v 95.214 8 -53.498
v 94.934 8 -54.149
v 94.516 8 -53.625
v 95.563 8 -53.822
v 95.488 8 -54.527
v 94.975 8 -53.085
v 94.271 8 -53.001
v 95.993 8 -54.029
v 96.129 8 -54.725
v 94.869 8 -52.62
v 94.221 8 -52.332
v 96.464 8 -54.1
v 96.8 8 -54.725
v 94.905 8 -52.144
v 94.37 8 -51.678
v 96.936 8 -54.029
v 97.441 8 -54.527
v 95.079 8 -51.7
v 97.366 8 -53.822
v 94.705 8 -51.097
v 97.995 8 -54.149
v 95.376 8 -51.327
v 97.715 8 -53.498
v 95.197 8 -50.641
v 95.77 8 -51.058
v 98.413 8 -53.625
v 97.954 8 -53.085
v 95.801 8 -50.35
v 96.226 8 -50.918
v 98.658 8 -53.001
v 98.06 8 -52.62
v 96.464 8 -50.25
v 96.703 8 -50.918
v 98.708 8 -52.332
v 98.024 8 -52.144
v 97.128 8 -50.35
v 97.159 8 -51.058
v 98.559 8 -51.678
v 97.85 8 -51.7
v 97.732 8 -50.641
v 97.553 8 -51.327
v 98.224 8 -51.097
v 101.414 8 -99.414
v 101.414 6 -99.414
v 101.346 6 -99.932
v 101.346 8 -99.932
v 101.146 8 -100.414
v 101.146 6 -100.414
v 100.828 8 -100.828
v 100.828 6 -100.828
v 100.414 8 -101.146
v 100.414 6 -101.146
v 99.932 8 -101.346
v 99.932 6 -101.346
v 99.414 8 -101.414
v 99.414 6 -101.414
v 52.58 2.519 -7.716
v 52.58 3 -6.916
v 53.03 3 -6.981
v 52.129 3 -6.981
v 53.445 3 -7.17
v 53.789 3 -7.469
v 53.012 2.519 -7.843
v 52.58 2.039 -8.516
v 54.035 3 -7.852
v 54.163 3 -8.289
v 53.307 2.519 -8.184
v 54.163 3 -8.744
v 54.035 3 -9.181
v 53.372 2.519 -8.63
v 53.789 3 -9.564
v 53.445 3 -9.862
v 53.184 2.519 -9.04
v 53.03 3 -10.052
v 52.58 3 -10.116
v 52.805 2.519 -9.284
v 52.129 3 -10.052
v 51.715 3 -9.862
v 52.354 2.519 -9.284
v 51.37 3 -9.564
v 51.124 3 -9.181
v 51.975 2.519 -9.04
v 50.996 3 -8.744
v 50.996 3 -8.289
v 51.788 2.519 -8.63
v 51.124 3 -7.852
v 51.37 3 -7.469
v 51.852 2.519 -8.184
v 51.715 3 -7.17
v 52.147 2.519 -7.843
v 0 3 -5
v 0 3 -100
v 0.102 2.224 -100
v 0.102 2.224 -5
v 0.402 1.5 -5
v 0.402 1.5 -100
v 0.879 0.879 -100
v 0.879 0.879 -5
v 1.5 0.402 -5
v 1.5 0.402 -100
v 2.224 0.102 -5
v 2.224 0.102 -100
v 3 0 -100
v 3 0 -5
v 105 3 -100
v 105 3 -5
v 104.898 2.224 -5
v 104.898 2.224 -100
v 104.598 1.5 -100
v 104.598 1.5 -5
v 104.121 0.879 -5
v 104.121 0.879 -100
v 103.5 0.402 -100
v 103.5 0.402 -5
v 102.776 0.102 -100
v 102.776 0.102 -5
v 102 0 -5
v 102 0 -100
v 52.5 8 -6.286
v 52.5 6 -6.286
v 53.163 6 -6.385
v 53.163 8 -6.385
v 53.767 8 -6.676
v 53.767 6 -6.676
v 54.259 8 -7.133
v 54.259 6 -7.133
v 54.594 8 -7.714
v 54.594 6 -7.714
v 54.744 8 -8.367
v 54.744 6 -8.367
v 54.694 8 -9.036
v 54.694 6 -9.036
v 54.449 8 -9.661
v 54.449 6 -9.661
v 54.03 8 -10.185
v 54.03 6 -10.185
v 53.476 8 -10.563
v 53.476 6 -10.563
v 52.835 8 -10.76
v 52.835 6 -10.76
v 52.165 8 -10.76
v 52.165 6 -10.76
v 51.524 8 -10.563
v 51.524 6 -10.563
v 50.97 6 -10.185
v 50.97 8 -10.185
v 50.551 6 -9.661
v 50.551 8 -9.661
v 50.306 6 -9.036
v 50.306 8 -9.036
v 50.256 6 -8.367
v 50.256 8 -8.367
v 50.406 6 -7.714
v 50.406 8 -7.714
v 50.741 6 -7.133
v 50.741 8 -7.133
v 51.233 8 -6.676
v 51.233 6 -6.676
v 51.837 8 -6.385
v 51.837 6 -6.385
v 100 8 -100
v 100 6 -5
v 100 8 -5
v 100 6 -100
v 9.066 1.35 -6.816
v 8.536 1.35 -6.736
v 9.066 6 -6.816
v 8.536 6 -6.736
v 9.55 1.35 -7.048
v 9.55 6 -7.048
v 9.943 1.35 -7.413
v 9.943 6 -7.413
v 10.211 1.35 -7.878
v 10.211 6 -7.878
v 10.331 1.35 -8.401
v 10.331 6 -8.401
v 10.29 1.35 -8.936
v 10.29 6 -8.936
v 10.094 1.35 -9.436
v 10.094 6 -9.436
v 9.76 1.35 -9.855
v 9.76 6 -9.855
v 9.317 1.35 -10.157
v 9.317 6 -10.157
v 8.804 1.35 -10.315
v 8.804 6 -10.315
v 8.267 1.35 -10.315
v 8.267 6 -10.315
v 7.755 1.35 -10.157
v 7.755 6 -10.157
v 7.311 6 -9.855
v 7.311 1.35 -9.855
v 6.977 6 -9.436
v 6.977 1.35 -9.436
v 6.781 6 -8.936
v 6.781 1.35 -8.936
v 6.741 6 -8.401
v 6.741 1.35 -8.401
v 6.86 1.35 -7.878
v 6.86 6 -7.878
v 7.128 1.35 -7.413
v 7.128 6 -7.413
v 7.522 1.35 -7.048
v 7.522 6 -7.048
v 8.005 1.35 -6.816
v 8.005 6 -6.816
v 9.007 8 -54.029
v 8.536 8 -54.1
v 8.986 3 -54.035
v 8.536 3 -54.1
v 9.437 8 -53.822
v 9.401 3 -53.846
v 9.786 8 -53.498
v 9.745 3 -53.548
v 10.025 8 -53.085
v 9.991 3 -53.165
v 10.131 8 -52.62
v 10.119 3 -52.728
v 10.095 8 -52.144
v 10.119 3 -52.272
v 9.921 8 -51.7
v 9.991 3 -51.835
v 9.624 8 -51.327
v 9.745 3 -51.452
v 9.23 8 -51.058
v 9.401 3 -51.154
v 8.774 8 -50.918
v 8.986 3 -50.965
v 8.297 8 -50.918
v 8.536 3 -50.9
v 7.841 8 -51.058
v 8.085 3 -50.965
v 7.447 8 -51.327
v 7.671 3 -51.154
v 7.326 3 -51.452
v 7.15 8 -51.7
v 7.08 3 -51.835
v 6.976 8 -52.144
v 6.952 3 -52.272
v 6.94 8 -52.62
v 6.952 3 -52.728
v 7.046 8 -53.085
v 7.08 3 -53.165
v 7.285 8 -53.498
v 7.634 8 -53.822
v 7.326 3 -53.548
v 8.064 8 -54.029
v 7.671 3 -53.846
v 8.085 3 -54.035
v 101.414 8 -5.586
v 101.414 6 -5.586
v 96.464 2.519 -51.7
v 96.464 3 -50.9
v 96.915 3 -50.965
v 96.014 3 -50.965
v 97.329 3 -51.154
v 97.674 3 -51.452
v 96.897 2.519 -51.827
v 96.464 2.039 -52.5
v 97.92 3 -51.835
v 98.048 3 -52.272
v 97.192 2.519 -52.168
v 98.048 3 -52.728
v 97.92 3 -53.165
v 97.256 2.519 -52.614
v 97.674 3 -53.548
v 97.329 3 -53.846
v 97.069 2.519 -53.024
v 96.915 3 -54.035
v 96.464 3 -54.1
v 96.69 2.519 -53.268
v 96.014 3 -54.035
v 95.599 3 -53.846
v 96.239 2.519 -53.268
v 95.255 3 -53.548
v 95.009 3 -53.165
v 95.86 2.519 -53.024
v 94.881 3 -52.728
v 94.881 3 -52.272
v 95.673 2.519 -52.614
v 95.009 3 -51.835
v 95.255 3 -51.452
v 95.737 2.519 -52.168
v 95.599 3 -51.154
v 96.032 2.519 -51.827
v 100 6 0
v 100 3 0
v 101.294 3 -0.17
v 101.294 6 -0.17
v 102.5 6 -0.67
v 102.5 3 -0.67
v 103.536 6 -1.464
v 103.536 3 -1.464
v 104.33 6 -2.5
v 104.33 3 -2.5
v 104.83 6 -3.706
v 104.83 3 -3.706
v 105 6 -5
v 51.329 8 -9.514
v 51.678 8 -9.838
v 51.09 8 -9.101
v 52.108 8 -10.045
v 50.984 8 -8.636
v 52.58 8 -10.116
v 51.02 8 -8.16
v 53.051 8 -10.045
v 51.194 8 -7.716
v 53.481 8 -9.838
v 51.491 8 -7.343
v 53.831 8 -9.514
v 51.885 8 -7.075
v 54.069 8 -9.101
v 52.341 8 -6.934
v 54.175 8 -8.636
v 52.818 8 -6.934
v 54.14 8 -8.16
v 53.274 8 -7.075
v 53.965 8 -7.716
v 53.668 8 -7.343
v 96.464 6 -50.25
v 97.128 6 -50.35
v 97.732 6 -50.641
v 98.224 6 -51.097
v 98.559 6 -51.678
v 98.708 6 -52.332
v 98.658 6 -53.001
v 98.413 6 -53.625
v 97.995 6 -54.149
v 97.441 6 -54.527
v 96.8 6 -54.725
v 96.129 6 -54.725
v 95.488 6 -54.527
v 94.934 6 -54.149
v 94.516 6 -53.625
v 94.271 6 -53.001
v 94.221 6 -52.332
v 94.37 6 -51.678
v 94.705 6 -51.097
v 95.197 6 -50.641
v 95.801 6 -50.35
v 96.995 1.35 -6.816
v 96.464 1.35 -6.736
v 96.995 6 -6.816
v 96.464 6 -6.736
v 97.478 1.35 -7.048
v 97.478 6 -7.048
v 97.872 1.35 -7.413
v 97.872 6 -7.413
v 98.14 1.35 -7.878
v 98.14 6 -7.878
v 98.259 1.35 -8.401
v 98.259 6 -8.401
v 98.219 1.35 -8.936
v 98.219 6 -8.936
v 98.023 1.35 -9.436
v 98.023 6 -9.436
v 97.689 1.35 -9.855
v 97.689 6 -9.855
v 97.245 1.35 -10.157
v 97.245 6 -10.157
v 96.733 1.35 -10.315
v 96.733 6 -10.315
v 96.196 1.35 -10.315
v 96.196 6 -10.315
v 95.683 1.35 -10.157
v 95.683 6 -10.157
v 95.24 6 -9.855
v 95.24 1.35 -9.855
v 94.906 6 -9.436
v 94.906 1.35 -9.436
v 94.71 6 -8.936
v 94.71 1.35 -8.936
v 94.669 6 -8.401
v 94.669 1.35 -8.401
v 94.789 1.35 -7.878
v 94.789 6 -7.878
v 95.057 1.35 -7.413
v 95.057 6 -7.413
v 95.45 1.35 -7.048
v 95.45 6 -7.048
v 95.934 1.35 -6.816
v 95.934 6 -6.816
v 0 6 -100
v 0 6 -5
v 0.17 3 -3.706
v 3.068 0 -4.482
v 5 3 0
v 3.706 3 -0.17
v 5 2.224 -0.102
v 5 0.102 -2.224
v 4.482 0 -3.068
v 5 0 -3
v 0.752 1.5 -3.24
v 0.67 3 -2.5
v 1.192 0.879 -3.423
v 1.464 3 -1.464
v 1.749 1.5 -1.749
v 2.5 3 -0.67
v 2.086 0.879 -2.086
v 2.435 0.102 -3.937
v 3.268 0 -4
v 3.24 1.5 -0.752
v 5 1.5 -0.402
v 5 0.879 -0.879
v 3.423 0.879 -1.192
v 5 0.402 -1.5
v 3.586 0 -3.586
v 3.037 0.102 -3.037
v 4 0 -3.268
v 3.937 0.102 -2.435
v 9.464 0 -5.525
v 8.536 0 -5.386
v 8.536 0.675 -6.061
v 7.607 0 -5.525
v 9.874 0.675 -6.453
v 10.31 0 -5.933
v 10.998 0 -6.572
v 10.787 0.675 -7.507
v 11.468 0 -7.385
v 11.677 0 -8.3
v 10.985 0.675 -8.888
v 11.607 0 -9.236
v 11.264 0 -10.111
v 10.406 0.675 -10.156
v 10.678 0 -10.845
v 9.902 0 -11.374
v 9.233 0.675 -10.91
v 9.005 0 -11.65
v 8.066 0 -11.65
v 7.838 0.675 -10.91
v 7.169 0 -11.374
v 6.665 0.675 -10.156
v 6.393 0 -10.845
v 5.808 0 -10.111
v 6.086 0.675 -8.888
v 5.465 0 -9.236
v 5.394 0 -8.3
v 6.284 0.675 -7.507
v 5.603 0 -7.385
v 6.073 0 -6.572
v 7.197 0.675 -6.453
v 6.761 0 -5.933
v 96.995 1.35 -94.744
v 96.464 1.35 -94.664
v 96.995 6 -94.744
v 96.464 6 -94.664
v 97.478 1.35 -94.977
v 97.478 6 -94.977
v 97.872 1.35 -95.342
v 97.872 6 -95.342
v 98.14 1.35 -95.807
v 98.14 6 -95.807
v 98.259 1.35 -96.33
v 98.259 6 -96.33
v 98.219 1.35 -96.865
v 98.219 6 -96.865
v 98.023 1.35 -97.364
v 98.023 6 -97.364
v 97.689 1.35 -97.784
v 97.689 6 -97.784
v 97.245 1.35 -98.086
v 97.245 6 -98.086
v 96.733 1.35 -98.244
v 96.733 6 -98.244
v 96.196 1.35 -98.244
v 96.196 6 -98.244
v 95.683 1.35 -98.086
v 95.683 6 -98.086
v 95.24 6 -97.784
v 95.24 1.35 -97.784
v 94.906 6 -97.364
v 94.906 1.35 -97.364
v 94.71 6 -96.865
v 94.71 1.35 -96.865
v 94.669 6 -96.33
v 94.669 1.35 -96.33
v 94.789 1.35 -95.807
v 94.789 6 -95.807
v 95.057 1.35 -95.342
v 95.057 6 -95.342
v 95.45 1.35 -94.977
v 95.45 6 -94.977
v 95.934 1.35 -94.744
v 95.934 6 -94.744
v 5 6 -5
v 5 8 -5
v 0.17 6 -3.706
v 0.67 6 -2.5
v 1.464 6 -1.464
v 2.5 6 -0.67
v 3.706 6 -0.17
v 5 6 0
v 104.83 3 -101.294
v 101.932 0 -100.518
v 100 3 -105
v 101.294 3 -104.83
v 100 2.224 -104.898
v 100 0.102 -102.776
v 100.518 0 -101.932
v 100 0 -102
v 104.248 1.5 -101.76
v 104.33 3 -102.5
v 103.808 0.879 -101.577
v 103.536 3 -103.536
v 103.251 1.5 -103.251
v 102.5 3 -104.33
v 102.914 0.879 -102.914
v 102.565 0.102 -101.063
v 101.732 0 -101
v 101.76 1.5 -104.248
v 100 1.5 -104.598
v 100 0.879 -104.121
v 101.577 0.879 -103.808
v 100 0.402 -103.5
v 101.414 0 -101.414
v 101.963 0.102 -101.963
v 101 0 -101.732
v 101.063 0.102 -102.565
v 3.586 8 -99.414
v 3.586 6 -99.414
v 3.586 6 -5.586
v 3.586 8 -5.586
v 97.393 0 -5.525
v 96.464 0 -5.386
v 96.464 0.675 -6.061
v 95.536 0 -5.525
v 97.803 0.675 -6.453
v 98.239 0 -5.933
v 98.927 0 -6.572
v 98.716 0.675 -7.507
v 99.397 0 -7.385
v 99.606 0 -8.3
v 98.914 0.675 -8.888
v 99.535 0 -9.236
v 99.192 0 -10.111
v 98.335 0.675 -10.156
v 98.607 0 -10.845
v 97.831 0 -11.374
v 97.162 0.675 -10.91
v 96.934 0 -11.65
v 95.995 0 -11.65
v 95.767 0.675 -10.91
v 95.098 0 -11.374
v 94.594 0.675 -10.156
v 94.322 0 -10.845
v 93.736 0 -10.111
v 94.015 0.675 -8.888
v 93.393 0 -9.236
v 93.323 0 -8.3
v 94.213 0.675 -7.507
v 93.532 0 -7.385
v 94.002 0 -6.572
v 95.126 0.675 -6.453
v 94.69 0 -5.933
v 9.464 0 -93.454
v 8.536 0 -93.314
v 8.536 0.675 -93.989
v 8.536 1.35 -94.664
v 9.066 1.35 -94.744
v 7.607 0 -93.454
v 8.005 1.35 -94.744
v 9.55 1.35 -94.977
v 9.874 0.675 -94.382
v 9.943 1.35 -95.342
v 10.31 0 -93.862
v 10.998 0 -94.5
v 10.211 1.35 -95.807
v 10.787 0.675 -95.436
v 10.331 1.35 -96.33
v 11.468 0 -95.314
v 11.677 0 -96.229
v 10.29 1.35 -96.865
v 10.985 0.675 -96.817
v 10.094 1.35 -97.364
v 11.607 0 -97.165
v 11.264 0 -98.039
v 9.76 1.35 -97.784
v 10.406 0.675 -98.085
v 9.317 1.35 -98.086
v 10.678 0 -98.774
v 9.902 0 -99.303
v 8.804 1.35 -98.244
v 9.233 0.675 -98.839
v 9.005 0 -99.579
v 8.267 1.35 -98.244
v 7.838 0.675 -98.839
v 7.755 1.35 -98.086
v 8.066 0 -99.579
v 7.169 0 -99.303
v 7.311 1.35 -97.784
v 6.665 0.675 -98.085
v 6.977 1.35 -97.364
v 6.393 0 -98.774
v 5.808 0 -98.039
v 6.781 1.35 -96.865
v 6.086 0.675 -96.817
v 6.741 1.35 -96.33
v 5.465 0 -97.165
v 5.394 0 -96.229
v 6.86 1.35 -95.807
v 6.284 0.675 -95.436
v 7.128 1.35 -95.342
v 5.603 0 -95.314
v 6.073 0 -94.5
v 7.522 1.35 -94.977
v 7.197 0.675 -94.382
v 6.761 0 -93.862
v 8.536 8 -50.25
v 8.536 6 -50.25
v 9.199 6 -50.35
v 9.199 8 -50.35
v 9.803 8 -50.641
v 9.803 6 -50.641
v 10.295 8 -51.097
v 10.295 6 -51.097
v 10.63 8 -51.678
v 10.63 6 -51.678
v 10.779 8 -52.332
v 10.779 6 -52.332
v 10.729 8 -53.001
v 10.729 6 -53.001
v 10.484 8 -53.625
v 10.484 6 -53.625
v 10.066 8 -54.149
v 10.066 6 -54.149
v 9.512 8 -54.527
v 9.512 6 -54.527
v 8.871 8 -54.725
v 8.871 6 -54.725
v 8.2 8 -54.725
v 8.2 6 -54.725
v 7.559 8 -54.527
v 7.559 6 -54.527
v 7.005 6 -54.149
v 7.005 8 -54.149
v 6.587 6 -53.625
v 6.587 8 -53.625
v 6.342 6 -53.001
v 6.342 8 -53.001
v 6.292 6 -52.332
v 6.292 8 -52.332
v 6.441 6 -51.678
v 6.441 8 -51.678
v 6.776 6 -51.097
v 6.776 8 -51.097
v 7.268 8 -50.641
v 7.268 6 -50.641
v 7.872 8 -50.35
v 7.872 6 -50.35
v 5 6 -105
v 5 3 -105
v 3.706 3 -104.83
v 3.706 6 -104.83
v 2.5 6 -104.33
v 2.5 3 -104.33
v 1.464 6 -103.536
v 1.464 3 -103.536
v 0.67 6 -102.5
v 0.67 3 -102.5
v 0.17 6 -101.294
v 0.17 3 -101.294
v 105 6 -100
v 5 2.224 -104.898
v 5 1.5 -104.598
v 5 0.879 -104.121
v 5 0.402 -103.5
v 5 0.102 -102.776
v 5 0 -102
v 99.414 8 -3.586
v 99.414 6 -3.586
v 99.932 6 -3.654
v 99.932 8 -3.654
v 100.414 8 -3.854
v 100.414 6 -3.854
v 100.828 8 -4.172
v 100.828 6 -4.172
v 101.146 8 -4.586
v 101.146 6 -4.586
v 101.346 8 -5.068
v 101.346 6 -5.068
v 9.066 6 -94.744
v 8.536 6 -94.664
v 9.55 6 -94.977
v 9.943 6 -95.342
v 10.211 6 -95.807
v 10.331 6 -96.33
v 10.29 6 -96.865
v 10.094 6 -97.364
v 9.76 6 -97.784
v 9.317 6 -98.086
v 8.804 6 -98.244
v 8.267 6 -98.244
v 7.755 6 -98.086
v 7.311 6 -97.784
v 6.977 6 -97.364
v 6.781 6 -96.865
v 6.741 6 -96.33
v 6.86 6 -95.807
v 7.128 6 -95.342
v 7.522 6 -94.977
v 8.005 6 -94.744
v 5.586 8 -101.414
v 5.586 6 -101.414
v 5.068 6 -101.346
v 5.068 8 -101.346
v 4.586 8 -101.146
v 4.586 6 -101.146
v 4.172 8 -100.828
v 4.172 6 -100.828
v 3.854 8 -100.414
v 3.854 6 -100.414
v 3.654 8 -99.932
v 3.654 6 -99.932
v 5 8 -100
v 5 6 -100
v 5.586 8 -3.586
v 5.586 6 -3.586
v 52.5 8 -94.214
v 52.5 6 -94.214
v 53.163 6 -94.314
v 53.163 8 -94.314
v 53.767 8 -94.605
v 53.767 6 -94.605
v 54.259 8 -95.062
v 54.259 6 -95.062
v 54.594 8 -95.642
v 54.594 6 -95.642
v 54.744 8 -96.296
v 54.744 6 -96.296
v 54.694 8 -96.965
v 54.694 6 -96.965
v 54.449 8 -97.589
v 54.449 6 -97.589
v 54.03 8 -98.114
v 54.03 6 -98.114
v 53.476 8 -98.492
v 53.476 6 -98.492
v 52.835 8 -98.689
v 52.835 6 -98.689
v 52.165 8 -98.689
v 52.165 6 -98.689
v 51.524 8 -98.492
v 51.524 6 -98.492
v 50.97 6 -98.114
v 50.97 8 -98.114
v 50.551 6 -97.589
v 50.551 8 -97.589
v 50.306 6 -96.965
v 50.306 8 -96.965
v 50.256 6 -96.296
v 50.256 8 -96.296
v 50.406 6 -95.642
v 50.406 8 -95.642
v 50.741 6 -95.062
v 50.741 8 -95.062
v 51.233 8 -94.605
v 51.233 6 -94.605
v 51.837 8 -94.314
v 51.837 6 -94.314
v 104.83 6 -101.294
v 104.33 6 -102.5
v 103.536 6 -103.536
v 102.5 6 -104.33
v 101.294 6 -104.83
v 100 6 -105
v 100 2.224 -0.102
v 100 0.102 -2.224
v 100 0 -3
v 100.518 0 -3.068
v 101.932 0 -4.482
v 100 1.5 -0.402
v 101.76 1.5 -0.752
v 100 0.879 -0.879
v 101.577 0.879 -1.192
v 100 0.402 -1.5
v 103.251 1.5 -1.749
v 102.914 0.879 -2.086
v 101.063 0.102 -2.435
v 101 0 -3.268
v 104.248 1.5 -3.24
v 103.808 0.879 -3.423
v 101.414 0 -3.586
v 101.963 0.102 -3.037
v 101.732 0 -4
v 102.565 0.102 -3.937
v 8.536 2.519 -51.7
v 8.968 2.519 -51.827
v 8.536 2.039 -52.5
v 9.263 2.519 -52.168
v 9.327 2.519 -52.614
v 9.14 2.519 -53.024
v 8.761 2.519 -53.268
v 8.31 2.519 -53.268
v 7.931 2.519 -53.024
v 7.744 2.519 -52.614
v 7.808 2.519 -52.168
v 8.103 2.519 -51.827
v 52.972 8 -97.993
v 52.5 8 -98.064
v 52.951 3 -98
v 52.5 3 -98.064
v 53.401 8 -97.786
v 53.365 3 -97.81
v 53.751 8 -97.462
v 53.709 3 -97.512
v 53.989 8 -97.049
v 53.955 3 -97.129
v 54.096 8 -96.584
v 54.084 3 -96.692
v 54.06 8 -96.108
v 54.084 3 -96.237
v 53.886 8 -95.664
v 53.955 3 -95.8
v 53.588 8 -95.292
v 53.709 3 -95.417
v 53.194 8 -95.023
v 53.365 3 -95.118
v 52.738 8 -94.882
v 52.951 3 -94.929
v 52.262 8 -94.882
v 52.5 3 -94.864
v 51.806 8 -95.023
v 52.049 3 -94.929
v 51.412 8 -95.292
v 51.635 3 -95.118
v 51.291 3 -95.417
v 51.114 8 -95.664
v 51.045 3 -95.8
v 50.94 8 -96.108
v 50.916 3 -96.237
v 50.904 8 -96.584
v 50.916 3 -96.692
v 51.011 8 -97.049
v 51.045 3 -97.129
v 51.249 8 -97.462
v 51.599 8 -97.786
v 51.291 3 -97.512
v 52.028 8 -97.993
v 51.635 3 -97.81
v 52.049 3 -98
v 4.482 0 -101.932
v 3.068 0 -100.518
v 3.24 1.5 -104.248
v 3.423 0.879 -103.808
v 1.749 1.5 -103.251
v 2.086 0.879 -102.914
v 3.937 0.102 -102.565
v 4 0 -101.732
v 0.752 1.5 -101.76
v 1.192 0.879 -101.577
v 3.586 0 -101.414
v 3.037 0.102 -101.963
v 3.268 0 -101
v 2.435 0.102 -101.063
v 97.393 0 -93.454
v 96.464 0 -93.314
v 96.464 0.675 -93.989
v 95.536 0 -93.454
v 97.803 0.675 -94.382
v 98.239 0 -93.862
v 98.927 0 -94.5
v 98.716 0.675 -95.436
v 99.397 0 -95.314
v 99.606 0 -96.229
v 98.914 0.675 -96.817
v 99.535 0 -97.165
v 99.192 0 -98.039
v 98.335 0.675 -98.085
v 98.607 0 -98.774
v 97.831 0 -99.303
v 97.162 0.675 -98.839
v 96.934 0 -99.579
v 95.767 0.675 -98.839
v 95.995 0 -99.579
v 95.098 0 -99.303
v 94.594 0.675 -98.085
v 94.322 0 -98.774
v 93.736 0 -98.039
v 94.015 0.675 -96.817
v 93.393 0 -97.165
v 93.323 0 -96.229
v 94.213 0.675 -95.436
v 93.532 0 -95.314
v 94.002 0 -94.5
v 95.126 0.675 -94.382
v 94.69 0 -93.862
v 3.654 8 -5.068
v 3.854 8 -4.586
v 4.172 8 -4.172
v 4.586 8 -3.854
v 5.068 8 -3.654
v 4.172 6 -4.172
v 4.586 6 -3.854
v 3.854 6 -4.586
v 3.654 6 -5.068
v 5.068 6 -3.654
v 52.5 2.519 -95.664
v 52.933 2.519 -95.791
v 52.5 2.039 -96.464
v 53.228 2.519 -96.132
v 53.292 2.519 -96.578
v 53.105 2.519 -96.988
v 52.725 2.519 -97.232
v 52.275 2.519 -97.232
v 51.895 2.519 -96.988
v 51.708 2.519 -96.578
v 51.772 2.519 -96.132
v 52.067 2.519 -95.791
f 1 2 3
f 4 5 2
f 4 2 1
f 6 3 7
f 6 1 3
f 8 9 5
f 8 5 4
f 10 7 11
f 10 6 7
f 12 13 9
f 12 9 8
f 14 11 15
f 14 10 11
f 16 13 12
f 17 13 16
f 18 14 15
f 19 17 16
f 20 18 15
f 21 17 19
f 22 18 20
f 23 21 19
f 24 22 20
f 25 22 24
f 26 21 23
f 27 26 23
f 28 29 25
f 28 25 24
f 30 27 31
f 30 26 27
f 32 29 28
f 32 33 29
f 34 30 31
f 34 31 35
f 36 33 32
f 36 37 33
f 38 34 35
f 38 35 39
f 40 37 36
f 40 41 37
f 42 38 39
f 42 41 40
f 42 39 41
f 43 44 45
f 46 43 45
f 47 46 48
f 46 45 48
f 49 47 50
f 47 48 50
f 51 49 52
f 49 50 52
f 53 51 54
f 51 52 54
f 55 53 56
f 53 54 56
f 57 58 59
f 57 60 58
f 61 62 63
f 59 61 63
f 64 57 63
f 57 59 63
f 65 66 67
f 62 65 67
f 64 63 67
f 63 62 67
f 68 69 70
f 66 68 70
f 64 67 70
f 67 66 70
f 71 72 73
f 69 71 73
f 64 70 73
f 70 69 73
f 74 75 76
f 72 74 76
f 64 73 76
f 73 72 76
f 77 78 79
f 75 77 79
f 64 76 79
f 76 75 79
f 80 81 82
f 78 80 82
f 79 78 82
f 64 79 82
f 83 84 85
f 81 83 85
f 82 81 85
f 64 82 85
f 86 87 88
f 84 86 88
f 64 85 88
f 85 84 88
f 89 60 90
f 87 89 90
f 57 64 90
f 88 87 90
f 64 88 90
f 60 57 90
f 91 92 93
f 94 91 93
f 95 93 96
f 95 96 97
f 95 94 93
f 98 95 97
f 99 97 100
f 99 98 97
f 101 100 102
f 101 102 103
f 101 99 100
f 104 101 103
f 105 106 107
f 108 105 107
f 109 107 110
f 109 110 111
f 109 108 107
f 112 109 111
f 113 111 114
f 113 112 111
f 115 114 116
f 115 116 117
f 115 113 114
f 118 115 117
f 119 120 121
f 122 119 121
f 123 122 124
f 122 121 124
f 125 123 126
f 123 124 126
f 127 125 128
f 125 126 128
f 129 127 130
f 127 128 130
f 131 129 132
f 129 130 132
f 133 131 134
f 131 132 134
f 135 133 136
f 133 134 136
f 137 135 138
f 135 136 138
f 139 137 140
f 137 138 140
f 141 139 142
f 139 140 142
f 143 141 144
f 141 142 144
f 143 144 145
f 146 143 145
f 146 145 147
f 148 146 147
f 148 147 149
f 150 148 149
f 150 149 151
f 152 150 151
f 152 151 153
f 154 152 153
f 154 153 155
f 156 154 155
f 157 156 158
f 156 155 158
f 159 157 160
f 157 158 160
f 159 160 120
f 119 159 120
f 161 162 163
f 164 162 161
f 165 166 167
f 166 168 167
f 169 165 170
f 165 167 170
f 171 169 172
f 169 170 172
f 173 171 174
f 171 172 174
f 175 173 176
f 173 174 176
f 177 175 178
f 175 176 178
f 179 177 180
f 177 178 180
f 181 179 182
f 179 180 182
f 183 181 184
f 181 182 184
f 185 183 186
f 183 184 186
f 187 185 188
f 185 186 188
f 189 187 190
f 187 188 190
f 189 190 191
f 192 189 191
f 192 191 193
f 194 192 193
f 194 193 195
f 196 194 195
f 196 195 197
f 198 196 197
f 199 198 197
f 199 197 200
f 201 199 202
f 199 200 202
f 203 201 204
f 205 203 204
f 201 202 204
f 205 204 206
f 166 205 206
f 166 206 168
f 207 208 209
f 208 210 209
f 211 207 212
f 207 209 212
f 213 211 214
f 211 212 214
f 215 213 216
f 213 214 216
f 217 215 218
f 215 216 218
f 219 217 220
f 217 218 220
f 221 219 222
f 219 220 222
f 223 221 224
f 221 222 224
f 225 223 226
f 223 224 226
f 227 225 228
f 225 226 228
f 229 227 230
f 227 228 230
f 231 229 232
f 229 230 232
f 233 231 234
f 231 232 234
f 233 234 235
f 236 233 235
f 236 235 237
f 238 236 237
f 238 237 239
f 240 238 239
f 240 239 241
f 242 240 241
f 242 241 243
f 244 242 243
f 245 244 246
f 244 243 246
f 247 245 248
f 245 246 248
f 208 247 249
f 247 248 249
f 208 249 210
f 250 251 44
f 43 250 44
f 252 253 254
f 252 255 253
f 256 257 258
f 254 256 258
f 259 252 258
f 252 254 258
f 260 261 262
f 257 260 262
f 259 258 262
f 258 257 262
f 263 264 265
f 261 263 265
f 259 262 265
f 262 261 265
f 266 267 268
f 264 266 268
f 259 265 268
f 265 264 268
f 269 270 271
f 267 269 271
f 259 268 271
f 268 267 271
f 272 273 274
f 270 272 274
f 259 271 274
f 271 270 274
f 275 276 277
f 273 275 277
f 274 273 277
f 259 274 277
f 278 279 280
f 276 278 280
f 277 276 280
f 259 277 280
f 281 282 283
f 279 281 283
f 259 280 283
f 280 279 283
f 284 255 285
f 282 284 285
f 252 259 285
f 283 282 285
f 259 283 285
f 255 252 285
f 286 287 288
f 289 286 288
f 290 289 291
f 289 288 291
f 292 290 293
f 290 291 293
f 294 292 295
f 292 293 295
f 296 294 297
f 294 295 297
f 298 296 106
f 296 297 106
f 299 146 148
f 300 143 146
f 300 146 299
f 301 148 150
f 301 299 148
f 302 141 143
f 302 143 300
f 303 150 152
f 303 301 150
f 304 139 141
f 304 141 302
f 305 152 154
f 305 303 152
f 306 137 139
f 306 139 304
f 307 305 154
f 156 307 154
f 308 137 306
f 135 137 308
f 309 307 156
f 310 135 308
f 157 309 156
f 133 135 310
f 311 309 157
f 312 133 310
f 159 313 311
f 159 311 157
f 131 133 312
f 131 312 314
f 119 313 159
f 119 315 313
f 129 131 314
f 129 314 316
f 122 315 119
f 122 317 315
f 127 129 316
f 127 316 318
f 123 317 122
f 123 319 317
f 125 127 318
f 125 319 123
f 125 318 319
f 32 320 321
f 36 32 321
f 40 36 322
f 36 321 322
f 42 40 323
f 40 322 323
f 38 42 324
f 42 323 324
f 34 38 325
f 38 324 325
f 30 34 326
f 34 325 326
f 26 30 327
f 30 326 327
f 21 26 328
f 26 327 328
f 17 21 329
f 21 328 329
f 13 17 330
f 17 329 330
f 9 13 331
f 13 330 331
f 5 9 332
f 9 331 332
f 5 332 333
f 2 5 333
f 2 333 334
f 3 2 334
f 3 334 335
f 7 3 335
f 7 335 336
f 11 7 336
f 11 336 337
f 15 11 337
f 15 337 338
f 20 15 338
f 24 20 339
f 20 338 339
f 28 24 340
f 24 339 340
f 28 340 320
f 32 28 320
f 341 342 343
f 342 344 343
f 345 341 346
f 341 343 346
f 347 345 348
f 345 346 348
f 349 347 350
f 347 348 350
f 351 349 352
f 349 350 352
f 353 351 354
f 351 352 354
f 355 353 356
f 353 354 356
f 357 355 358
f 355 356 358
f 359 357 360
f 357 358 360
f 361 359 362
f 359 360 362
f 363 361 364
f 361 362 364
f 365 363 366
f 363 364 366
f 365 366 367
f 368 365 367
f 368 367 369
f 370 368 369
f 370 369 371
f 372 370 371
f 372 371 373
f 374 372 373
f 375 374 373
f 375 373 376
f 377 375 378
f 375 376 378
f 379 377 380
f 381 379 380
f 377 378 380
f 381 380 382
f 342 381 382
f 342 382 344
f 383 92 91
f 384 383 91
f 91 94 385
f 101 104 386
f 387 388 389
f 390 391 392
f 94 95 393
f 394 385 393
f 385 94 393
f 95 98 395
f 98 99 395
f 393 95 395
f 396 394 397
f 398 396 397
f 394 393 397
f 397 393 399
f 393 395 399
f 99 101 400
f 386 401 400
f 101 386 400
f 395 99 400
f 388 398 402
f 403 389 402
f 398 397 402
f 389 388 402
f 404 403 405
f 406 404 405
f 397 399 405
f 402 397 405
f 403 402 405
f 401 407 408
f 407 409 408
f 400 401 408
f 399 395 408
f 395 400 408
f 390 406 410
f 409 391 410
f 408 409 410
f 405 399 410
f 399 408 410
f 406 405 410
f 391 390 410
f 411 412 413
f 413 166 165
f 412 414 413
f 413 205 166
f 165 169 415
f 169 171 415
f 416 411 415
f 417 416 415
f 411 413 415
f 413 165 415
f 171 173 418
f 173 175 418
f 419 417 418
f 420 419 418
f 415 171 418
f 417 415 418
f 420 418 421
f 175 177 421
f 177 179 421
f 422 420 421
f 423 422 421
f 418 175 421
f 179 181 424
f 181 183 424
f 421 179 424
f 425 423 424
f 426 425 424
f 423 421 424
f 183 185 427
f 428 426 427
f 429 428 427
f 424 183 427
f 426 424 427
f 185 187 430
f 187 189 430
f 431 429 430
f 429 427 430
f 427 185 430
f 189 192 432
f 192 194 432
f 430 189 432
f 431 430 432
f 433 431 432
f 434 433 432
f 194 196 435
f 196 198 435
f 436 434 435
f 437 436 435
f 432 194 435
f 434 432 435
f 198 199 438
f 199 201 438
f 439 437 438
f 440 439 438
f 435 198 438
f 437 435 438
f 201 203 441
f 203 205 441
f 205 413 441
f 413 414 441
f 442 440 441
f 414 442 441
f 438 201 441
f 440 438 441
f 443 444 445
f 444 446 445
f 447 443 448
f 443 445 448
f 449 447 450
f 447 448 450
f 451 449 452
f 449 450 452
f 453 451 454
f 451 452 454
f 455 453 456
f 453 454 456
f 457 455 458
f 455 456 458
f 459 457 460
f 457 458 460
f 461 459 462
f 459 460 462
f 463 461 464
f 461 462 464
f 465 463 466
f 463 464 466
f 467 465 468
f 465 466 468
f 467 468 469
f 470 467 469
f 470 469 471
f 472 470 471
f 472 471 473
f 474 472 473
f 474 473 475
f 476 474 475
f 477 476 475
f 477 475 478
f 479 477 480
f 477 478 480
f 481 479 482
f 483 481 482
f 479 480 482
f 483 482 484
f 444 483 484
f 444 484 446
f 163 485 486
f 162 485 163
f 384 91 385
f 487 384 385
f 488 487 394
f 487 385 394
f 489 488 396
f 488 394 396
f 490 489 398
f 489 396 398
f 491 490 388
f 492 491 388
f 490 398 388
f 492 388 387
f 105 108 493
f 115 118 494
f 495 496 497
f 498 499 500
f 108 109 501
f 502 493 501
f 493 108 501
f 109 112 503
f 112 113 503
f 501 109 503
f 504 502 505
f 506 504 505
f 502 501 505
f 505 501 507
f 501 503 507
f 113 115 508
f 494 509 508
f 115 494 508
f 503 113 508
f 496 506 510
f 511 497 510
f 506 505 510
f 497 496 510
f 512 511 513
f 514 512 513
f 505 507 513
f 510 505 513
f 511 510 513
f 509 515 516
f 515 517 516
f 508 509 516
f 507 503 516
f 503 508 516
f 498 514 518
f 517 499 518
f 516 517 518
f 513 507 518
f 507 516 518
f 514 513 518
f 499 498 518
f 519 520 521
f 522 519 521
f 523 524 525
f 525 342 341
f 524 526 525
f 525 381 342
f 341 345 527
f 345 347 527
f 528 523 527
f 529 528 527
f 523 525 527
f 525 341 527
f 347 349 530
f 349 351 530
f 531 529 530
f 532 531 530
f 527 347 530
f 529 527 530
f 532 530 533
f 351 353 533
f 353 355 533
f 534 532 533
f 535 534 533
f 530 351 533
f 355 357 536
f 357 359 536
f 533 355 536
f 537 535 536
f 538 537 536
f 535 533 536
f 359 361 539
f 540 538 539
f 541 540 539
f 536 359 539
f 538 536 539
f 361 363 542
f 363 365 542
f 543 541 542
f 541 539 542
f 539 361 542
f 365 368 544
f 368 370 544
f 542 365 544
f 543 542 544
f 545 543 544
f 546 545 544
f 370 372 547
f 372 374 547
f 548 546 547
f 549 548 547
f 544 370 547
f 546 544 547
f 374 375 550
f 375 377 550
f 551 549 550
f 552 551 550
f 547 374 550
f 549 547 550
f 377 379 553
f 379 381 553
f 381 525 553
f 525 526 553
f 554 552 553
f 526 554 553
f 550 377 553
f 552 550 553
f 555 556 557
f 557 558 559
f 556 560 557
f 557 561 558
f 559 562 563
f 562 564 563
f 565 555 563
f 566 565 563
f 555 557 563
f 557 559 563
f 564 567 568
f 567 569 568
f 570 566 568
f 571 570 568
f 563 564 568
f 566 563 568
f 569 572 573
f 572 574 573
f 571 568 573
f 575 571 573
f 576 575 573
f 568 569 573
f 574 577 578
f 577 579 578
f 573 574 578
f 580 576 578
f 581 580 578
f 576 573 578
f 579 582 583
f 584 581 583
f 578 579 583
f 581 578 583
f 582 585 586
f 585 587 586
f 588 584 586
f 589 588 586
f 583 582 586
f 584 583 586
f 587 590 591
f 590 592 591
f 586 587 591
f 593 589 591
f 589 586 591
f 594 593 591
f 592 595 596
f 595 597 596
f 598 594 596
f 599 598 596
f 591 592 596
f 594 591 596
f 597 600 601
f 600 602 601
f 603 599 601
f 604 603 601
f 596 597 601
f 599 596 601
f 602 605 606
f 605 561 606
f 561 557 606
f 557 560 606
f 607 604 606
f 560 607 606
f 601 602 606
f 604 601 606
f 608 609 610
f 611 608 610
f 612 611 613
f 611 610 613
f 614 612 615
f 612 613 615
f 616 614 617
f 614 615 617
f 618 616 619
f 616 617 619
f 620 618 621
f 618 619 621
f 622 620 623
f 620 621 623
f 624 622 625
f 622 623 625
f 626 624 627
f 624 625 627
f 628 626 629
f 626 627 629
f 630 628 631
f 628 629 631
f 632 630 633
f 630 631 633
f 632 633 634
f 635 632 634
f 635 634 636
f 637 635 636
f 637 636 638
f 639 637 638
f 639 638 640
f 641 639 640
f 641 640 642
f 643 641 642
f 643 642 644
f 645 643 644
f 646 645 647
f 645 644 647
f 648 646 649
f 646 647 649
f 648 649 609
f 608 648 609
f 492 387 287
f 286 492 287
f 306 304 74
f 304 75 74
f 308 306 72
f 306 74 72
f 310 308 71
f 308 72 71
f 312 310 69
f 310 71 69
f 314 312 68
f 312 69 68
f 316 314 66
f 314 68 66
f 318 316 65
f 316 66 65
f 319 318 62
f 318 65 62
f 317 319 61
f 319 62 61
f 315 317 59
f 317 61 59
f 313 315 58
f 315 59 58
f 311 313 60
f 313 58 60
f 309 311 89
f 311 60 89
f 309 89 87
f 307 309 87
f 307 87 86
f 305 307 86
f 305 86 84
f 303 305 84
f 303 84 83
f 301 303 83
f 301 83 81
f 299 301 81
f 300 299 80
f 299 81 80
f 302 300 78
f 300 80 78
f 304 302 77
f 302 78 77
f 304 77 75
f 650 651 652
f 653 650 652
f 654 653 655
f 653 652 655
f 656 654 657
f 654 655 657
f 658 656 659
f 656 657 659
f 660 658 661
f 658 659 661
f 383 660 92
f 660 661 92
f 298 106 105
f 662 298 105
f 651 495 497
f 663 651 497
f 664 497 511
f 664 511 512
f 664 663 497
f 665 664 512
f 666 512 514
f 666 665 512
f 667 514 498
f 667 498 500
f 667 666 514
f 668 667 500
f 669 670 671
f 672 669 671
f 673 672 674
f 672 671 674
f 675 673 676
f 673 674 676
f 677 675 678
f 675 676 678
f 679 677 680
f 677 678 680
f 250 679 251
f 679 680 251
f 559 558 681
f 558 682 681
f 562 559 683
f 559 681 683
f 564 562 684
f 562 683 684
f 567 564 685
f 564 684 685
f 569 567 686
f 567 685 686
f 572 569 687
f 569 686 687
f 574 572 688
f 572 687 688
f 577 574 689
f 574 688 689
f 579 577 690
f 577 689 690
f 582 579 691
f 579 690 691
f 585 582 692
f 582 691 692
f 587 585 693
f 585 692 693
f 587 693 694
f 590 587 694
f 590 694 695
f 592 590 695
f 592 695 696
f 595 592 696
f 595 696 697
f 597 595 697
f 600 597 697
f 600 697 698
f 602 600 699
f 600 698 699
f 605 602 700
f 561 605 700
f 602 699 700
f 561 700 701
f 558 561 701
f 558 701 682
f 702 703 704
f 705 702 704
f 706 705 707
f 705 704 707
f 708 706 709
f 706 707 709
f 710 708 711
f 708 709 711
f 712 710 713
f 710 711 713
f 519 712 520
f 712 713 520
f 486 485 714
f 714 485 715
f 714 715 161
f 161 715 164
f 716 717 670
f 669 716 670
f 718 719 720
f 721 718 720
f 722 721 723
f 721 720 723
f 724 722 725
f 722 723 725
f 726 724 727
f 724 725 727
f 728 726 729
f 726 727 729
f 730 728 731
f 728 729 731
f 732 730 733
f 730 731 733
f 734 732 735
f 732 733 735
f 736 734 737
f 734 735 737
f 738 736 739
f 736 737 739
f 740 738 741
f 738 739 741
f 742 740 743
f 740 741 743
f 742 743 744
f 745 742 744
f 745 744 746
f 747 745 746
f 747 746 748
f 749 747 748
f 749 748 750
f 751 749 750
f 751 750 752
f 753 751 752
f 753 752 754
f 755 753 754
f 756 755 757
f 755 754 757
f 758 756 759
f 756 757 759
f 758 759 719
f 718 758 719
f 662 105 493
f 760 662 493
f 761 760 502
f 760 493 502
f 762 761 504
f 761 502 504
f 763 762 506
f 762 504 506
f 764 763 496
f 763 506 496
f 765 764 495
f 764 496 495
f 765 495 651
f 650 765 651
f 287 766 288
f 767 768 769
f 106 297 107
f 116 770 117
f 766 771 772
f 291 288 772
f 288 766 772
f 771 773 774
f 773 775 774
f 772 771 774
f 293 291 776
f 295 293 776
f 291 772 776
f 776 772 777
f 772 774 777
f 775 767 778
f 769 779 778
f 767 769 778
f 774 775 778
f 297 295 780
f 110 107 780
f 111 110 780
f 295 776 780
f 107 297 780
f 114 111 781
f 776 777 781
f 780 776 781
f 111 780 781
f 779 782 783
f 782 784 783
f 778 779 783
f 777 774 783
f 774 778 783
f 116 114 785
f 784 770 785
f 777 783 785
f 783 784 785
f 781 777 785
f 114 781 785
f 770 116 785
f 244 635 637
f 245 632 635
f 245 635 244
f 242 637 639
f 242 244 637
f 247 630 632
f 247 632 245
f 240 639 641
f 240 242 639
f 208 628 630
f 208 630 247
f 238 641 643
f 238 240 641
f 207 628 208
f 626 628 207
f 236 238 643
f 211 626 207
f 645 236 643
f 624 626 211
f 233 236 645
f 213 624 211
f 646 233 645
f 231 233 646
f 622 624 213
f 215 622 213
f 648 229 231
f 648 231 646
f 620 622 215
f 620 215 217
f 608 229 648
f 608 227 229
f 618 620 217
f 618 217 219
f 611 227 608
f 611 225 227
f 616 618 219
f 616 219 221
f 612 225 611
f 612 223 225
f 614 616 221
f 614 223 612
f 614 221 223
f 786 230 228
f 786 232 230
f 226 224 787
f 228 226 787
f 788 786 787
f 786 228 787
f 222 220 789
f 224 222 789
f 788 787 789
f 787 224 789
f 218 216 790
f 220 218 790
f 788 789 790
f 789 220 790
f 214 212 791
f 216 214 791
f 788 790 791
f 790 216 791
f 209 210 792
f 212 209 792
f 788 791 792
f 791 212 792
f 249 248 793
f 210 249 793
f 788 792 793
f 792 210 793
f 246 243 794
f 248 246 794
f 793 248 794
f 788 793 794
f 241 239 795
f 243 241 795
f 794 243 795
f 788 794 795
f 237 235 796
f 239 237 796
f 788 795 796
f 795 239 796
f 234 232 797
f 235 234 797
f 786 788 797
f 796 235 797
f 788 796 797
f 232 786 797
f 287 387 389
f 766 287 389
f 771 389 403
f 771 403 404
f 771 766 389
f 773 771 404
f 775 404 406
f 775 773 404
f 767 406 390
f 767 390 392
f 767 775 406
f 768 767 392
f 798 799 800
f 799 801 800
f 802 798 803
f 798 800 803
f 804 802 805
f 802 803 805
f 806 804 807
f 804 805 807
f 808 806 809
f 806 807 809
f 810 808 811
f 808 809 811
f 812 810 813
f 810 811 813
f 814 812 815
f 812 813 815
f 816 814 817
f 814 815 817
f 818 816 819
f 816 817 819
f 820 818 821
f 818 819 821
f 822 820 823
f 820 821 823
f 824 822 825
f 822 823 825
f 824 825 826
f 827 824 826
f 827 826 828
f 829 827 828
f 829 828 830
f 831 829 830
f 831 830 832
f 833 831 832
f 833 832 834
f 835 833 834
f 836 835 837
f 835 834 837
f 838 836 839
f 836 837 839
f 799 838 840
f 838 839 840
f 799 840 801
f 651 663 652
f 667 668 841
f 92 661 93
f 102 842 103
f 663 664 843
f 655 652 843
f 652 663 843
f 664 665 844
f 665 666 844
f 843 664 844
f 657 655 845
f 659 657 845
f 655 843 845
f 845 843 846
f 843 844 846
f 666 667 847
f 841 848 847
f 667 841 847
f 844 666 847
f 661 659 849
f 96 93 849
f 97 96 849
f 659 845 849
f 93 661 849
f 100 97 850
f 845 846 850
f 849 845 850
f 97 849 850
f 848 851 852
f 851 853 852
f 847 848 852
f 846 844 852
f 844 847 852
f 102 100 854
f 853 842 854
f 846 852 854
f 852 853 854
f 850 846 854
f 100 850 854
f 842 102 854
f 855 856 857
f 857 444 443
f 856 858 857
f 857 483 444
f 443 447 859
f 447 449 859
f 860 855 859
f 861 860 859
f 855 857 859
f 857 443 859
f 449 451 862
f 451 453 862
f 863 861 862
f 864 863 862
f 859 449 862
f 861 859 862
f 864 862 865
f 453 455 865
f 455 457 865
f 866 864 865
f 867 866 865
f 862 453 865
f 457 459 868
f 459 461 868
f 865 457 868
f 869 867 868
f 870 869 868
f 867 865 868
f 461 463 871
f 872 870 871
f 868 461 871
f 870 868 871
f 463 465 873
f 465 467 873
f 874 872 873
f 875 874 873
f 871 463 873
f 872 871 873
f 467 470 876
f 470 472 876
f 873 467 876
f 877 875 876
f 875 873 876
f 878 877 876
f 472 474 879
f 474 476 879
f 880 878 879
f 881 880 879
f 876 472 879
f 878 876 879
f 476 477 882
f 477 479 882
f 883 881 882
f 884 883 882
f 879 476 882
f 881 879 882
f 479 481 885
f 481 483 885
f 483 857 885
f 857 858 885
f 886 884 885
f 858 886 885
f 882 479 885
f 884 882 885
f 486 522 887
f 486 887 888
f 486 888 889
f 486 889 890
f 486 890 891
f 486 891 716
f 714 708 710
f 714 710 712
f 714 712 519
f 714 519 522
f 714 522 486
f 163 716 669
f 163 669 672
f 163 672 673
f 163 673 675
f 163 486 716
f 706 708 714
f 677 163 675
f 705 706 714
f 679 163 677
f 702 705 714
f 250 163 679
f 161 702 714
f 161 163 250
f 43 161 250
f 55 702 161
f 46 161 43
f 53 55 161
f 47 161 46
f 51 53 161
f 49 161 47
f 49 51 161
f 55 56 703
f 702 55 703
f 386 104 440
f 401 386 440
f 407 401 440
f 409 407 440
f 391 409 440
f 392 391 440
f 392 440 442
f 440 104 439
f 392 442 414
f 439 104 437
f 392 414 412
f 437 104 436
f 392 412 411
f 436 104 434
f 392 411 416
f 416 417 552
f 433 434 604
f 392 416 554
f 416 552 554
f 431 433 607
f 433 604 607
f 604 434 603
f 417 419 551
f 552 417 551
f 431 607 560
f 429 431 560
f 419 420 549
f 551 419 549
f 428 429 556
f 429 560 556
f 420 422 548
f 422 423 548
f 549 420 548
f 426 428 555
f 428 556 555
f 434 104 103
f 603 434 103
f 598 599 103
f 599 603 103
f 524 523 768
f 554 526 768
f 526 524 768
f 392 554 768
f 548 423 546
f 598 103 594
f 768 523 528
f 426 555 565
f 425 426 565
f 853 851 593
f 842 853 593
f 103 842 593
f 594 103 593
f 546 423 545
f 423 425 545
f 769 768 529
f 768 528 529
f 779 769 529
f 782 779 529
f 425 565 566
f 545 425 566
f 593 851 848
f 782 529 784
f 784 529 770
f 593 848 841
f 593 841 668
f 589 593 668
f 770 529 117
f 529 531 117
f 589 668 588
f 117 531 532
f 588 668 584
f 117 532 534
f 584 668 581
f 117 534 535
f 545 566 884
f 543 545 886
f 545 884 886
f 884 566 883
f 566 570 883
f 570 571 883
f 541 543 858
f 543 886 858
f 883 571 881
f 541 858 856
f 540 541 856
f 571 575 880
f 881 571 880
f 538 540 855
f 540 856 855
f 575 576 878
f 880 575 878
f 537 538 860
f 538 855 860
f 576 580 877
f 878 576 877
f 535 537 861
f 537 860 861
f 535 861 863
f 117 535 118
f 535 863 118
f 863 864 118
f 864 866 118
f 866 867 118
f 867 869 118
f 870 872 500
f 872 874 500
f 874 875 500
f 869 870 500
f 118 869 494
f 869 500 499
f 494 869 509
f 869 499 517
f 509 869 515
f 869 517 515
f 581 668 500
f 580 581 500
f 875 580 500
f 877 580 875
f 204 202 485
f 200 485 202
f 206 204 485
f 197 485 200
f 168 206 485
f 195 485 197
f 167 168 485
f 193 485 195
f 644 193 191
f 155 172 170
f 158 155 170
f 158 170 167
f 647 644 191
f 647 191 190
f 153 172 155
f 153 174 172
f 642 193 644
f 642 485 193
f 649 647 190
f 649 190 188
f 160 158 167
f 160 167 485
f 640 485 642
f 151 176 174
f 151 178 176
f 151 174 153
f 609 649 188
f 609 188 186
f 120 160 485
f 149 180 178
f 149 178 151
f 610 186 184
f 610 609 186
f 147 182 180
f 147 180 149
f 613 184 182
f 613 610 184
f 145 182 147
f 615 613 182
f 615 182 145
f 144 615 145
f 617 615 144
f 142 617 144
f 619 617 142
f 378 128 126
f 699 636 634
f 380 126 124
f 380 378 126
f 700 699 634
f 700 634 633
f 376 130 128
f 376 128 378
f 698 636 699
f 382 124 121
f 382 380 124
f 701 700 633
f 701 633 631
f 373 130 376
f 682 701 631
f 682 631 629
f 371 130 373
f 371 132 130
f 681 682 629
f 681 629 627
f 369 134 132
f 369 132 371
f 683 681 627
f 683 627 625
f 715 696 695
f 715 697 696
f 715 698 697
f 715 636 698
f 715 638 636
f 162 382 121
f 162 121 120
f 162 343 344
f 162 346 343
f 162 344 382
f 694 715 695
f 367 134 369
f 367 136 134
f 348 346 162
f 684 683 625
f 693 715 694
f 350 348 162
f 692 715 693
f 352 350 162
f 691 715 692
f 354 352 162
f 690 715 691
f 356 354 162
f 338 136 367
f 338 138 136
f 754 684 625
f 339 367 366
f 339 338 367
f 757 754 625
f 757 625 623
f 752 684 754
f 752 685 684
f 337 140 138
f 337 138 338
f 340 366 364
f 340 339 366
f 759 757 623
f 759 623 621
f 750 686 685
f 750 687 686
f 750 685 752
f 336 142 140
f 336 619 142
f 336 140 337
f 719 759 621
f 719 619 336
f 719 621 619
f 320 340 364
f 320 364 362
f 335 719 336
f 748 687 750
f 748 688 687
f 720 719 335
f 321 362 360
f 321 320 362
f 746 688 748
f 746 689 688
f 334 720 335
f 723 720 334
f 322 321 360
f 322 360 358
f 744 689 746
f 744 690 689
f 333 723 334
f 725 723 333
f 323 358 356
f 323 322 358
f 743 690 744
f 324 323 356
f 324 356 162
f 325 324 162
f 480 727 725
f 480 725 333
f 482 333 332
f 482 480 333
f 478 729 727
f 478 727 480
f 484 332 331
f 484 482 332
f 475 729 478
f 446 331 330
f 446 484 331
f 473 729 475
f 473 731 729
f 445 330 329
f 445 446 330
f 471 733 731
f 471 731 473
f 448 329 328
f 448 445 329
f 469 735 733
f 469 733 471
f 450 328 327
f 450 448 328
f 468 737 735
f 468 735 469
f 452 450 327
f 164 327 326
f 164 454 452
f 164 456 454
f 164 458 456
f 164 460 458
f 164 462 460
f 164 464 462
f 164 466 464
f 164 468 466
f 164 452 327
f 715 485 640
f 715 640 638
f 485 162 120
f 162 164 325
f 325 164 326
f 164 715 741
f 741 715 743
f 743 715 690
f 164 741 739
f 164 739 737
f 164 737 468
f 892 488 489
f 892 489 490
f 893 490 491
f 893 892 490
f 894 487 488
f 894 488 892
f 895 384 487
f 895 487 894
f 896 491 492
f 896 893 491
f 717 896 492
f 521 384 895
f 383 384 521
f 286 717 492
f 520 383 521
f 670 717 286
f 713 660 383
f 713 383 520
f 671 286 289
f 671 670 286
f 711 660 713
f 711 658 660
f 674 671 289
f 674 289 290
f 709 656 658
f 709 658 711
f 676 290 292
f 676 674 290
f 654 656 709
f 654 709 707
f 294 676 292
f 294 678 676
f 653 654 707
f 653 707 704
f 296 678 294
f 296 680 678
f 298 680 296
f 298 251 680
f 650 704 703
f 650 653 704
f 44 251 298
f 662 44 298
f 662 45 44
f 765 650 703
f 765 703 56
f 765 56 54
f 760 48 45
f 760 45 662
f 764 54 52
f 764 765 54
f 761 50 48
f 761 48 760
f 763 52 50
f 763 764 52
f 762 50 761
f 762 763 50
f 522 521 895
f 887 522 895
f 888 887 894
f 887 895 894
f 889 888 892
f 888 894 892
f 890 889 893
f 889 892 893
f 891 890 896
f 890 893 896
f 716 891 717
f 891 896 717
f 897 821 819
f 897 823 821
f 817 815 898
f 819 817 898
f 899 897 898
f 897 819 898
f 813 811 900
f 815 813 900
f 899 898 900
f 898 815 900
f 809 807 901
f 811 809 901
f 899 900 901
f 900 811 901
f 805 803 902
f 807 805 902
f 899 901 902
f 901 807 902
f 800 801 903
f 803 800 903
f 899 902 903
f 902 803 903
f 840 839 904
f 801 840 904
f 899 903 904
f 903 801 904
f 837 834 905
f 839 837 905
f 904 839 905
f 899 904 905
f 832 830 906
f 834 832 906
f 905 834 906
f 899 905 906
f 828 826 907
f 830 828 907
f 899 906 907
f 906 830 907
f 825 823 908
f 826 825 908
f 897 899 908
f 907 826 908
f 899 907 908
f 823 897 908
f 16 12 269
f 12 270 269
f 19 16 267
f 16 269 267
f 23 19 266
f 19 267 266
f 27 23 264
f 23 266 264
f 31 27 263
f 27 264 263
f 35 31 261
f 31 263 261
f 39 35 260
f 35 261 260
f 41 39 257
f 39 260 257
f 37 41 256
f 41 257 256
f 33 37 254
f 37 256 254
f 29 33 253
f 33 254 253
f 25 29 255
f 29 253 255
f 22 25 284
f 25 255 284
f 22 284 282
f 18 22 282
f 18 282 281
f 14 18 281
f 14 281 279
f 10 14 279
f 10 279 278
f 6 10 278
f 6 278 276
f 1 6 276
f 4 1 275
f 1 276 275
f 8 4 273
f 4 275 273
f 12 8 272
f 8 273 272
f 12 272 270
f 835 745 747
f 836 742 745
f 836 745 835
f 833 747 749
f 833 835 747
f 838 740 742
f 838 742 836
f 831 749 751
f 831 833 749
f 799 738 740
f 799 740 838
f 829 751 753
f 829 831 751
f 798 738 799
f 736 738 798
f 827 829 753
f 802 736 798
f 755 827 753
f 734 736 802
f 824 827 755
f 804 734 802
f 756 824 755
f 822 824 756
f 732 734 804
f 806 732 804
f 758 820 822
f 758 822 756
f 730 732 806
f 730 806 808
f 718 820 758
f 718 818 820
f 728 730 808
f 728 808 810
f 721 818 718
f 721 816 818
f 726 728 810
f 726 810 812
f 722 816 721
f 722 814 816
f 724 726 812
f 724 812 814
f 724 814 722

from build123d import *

# Parameters (mm, degrees)
BOSS_EXTRUDE1_DEPTH                             = 6
FILLET1_R                                       = 3
CSK_FOR_M3_FLAT_HEAD_MACHINE_SCREW1_D           = 3.6
CSK_FOR_M3_FLAT_HEAD_MACHINE_SCREW1_CSINK_D     = 6.3
CSK_FOR_M3_FLAT_HEAD_MACHINE_SCREW1_CSINK_ANGLE = 90
SKETCH5_W                                       = 95
SKETCH5_H                                       = 95
BOSS_EXTRUDE2_DEPTH                             = 2
SKETCH6_R                                       = 2.25
BOSS_EXTRUDE3_DEPTH                             = 2
M3_CLEARANCE_HOLE1_D                            = 3.2
M3_CLEARANCE_HOLE1_DEPTH                        = 5
M3_CLEARANCE_HOLE1_TIP                          = 0.96137699


with BuildPart() as part:
    # Sketch1 → Boss-Extrude1 (new body)
    with BuildSketch(Plane(origin=(0, 0, 0), x_dir=(1, 0, 0), z_dir=(0, 1, 0))):
        with BuildLine():
            Line((5, 0), (100, 0))
            ThreePointArc((100, 0), (103.535533906, 1.464466094), (105, 5))
            Line((105, 5), (105, 100))
            ThreePointArc((105, 100), (103.535533906, 103.535533906), (100, 105))
            Line((100, 105), (5, 105))
            ThreePointArc((5, 105), (1.464466094, 103.535533906), (0, 100))
            Line((0, 100), (0, 5))
            ThreePointArc((0, 5), (1.464466094, 1.464466094), (5, 0))
        make_face()
    extrude(amount=BOSS_EXTRUDE1_DEPTH)

    # Fillet1
    fillet1_edges = [part.edges().sort_by_distance(p)[0] for p in [
        (52.5, 0, -105),
        (103.535533906, 0, -103.535533906),
        (105, 0, -52.5),
        (103.535533906, 0, -1.464466094),
        (52.5, 0, 0),
        (1.464466094, 0, -1.464466094),
        (0, 0, -52.5),
        (1.464466094, 0, -103.535533906),
    ]]
    fillet(fillet1_edges, radius=FILLET1_R)

    # CSK for M3 Flat Head Machine Screw1 (through all)
    with Locations(Plane(origin=(8.535533906, 0, -8.535533906), x_dir=(0, 0, -1), z_dir=(0, -1, 0))):
        with Locations((0, 0), (87.928932188, 0), (87.928932188, 87.928932188), (0, 87.928932188)):
            CounterSinkHole(CSK_FOR_M3_FLAT_HEAD_MACHINE_SCREW1_D / 2, CSK_FOR_M3_FLAT_HEAD_MACHINE_SCREW1_CSINK_D / 2, counter_sink_angle=CSK_FOR_M3_FLAT_HEAD_MACHINE_SCREW1_CSINK_ANGLE)

    # Sketch5 → Boss-Extrude2 (add)
    with BuildSketch(Plane(origin=(0, 6, 0), x_dir=(1, 0, 0), z_dir=(0, 1, 0))):
        with BuildLine():
            Line((5.585786438, 3.585786438), (99.414213562, 3.585786438))
            ThreePointArc((99.414213562, 3.585786438), (100.828427125, 4.171572875), (101.414213562, 5.585786438))
            Line((101.414213562, 5.585786438), (101.414213562, 99.414213562))
            ThreePointArc((101.414213562, 99.414213562), (100.828427125, 100.828427125), (99.414213562, 101.414213562))
            Line((99.414213562, 101.414213562), (5.585786438, 101.414213562))
            ThreePointArc((5.585786438, 101.414213562), (4.171572875, 100.828427125), (3.585786438, 99.414213562))
            Line((3.585786438, 99.414213562), (3.585786438, 5.585786438))
            ThreePointArc((3.585786438, 5.585786438), (4.171572875, 4.171572875), (5.585786438, 3.585786438))
        make_face()
        with Locations((52.5, 52.5)):
            Rectangle(SKETCH5_W, SKETCH5_H, mode=Mode.SUBTRACT)
    extrude(amount=BOSS_EXTRUDE2_DEPTH)

    # Sketch6 → Boss-Extrude3 (add)
    with BuildSketch(Plane(origin=(0, 6, 0), x_dir=(1, 0, 0), z_dir=(0, 1, 0))):
        with Locations(Location((8.535533906, 52.5, 0), (0, 0, 270))):
            Circle(SKETCH6_R)
        with Locations(Location((52.5, 8.535533906, 0), (0, 0, 270))):
            Circle(SKETCH6_R)
        with Locations(Location((96.464466094, 52.5, 0), (0, 0, 270))):
            Circle(SKETCH6_R)
        with Locations(Location((52.5, 96.464466094, 0), (0, 0, 270))):
            Circle(SKETCH6_R)
    extrude(amount=BOSS_EXTRUDE3_DEPTH)

    # M3 Clearance Hole1
    with Locations(Plane(origin=(8.535533906, 8, -52.5), x_dir=(0, 0, 1), z_dir=(0, 1, 0))):
        with Locations((0, 0), (43.983643016, 44.044146607), (0, 87.928932188), (-43.964466094, 43.964466094)):
            Hole(M3_CLEARANCE_HOLE1_D / 2, depth=M3_CLEARANCE_HOLE1_DEPTH)
            with Locations((0, 0, -(M3_CLEARANCE_HOLE1_DEPTH + M3_CLEARANCE_HOLE1_TIP / 2))):  # 118° drill point
                Cone(0, M3_CLEARANCE_HOLE1_D / 2, M3_CLEARANCE_HOLE1_TIP, mode=Mode.SUBTRACT)


solid = part.part
